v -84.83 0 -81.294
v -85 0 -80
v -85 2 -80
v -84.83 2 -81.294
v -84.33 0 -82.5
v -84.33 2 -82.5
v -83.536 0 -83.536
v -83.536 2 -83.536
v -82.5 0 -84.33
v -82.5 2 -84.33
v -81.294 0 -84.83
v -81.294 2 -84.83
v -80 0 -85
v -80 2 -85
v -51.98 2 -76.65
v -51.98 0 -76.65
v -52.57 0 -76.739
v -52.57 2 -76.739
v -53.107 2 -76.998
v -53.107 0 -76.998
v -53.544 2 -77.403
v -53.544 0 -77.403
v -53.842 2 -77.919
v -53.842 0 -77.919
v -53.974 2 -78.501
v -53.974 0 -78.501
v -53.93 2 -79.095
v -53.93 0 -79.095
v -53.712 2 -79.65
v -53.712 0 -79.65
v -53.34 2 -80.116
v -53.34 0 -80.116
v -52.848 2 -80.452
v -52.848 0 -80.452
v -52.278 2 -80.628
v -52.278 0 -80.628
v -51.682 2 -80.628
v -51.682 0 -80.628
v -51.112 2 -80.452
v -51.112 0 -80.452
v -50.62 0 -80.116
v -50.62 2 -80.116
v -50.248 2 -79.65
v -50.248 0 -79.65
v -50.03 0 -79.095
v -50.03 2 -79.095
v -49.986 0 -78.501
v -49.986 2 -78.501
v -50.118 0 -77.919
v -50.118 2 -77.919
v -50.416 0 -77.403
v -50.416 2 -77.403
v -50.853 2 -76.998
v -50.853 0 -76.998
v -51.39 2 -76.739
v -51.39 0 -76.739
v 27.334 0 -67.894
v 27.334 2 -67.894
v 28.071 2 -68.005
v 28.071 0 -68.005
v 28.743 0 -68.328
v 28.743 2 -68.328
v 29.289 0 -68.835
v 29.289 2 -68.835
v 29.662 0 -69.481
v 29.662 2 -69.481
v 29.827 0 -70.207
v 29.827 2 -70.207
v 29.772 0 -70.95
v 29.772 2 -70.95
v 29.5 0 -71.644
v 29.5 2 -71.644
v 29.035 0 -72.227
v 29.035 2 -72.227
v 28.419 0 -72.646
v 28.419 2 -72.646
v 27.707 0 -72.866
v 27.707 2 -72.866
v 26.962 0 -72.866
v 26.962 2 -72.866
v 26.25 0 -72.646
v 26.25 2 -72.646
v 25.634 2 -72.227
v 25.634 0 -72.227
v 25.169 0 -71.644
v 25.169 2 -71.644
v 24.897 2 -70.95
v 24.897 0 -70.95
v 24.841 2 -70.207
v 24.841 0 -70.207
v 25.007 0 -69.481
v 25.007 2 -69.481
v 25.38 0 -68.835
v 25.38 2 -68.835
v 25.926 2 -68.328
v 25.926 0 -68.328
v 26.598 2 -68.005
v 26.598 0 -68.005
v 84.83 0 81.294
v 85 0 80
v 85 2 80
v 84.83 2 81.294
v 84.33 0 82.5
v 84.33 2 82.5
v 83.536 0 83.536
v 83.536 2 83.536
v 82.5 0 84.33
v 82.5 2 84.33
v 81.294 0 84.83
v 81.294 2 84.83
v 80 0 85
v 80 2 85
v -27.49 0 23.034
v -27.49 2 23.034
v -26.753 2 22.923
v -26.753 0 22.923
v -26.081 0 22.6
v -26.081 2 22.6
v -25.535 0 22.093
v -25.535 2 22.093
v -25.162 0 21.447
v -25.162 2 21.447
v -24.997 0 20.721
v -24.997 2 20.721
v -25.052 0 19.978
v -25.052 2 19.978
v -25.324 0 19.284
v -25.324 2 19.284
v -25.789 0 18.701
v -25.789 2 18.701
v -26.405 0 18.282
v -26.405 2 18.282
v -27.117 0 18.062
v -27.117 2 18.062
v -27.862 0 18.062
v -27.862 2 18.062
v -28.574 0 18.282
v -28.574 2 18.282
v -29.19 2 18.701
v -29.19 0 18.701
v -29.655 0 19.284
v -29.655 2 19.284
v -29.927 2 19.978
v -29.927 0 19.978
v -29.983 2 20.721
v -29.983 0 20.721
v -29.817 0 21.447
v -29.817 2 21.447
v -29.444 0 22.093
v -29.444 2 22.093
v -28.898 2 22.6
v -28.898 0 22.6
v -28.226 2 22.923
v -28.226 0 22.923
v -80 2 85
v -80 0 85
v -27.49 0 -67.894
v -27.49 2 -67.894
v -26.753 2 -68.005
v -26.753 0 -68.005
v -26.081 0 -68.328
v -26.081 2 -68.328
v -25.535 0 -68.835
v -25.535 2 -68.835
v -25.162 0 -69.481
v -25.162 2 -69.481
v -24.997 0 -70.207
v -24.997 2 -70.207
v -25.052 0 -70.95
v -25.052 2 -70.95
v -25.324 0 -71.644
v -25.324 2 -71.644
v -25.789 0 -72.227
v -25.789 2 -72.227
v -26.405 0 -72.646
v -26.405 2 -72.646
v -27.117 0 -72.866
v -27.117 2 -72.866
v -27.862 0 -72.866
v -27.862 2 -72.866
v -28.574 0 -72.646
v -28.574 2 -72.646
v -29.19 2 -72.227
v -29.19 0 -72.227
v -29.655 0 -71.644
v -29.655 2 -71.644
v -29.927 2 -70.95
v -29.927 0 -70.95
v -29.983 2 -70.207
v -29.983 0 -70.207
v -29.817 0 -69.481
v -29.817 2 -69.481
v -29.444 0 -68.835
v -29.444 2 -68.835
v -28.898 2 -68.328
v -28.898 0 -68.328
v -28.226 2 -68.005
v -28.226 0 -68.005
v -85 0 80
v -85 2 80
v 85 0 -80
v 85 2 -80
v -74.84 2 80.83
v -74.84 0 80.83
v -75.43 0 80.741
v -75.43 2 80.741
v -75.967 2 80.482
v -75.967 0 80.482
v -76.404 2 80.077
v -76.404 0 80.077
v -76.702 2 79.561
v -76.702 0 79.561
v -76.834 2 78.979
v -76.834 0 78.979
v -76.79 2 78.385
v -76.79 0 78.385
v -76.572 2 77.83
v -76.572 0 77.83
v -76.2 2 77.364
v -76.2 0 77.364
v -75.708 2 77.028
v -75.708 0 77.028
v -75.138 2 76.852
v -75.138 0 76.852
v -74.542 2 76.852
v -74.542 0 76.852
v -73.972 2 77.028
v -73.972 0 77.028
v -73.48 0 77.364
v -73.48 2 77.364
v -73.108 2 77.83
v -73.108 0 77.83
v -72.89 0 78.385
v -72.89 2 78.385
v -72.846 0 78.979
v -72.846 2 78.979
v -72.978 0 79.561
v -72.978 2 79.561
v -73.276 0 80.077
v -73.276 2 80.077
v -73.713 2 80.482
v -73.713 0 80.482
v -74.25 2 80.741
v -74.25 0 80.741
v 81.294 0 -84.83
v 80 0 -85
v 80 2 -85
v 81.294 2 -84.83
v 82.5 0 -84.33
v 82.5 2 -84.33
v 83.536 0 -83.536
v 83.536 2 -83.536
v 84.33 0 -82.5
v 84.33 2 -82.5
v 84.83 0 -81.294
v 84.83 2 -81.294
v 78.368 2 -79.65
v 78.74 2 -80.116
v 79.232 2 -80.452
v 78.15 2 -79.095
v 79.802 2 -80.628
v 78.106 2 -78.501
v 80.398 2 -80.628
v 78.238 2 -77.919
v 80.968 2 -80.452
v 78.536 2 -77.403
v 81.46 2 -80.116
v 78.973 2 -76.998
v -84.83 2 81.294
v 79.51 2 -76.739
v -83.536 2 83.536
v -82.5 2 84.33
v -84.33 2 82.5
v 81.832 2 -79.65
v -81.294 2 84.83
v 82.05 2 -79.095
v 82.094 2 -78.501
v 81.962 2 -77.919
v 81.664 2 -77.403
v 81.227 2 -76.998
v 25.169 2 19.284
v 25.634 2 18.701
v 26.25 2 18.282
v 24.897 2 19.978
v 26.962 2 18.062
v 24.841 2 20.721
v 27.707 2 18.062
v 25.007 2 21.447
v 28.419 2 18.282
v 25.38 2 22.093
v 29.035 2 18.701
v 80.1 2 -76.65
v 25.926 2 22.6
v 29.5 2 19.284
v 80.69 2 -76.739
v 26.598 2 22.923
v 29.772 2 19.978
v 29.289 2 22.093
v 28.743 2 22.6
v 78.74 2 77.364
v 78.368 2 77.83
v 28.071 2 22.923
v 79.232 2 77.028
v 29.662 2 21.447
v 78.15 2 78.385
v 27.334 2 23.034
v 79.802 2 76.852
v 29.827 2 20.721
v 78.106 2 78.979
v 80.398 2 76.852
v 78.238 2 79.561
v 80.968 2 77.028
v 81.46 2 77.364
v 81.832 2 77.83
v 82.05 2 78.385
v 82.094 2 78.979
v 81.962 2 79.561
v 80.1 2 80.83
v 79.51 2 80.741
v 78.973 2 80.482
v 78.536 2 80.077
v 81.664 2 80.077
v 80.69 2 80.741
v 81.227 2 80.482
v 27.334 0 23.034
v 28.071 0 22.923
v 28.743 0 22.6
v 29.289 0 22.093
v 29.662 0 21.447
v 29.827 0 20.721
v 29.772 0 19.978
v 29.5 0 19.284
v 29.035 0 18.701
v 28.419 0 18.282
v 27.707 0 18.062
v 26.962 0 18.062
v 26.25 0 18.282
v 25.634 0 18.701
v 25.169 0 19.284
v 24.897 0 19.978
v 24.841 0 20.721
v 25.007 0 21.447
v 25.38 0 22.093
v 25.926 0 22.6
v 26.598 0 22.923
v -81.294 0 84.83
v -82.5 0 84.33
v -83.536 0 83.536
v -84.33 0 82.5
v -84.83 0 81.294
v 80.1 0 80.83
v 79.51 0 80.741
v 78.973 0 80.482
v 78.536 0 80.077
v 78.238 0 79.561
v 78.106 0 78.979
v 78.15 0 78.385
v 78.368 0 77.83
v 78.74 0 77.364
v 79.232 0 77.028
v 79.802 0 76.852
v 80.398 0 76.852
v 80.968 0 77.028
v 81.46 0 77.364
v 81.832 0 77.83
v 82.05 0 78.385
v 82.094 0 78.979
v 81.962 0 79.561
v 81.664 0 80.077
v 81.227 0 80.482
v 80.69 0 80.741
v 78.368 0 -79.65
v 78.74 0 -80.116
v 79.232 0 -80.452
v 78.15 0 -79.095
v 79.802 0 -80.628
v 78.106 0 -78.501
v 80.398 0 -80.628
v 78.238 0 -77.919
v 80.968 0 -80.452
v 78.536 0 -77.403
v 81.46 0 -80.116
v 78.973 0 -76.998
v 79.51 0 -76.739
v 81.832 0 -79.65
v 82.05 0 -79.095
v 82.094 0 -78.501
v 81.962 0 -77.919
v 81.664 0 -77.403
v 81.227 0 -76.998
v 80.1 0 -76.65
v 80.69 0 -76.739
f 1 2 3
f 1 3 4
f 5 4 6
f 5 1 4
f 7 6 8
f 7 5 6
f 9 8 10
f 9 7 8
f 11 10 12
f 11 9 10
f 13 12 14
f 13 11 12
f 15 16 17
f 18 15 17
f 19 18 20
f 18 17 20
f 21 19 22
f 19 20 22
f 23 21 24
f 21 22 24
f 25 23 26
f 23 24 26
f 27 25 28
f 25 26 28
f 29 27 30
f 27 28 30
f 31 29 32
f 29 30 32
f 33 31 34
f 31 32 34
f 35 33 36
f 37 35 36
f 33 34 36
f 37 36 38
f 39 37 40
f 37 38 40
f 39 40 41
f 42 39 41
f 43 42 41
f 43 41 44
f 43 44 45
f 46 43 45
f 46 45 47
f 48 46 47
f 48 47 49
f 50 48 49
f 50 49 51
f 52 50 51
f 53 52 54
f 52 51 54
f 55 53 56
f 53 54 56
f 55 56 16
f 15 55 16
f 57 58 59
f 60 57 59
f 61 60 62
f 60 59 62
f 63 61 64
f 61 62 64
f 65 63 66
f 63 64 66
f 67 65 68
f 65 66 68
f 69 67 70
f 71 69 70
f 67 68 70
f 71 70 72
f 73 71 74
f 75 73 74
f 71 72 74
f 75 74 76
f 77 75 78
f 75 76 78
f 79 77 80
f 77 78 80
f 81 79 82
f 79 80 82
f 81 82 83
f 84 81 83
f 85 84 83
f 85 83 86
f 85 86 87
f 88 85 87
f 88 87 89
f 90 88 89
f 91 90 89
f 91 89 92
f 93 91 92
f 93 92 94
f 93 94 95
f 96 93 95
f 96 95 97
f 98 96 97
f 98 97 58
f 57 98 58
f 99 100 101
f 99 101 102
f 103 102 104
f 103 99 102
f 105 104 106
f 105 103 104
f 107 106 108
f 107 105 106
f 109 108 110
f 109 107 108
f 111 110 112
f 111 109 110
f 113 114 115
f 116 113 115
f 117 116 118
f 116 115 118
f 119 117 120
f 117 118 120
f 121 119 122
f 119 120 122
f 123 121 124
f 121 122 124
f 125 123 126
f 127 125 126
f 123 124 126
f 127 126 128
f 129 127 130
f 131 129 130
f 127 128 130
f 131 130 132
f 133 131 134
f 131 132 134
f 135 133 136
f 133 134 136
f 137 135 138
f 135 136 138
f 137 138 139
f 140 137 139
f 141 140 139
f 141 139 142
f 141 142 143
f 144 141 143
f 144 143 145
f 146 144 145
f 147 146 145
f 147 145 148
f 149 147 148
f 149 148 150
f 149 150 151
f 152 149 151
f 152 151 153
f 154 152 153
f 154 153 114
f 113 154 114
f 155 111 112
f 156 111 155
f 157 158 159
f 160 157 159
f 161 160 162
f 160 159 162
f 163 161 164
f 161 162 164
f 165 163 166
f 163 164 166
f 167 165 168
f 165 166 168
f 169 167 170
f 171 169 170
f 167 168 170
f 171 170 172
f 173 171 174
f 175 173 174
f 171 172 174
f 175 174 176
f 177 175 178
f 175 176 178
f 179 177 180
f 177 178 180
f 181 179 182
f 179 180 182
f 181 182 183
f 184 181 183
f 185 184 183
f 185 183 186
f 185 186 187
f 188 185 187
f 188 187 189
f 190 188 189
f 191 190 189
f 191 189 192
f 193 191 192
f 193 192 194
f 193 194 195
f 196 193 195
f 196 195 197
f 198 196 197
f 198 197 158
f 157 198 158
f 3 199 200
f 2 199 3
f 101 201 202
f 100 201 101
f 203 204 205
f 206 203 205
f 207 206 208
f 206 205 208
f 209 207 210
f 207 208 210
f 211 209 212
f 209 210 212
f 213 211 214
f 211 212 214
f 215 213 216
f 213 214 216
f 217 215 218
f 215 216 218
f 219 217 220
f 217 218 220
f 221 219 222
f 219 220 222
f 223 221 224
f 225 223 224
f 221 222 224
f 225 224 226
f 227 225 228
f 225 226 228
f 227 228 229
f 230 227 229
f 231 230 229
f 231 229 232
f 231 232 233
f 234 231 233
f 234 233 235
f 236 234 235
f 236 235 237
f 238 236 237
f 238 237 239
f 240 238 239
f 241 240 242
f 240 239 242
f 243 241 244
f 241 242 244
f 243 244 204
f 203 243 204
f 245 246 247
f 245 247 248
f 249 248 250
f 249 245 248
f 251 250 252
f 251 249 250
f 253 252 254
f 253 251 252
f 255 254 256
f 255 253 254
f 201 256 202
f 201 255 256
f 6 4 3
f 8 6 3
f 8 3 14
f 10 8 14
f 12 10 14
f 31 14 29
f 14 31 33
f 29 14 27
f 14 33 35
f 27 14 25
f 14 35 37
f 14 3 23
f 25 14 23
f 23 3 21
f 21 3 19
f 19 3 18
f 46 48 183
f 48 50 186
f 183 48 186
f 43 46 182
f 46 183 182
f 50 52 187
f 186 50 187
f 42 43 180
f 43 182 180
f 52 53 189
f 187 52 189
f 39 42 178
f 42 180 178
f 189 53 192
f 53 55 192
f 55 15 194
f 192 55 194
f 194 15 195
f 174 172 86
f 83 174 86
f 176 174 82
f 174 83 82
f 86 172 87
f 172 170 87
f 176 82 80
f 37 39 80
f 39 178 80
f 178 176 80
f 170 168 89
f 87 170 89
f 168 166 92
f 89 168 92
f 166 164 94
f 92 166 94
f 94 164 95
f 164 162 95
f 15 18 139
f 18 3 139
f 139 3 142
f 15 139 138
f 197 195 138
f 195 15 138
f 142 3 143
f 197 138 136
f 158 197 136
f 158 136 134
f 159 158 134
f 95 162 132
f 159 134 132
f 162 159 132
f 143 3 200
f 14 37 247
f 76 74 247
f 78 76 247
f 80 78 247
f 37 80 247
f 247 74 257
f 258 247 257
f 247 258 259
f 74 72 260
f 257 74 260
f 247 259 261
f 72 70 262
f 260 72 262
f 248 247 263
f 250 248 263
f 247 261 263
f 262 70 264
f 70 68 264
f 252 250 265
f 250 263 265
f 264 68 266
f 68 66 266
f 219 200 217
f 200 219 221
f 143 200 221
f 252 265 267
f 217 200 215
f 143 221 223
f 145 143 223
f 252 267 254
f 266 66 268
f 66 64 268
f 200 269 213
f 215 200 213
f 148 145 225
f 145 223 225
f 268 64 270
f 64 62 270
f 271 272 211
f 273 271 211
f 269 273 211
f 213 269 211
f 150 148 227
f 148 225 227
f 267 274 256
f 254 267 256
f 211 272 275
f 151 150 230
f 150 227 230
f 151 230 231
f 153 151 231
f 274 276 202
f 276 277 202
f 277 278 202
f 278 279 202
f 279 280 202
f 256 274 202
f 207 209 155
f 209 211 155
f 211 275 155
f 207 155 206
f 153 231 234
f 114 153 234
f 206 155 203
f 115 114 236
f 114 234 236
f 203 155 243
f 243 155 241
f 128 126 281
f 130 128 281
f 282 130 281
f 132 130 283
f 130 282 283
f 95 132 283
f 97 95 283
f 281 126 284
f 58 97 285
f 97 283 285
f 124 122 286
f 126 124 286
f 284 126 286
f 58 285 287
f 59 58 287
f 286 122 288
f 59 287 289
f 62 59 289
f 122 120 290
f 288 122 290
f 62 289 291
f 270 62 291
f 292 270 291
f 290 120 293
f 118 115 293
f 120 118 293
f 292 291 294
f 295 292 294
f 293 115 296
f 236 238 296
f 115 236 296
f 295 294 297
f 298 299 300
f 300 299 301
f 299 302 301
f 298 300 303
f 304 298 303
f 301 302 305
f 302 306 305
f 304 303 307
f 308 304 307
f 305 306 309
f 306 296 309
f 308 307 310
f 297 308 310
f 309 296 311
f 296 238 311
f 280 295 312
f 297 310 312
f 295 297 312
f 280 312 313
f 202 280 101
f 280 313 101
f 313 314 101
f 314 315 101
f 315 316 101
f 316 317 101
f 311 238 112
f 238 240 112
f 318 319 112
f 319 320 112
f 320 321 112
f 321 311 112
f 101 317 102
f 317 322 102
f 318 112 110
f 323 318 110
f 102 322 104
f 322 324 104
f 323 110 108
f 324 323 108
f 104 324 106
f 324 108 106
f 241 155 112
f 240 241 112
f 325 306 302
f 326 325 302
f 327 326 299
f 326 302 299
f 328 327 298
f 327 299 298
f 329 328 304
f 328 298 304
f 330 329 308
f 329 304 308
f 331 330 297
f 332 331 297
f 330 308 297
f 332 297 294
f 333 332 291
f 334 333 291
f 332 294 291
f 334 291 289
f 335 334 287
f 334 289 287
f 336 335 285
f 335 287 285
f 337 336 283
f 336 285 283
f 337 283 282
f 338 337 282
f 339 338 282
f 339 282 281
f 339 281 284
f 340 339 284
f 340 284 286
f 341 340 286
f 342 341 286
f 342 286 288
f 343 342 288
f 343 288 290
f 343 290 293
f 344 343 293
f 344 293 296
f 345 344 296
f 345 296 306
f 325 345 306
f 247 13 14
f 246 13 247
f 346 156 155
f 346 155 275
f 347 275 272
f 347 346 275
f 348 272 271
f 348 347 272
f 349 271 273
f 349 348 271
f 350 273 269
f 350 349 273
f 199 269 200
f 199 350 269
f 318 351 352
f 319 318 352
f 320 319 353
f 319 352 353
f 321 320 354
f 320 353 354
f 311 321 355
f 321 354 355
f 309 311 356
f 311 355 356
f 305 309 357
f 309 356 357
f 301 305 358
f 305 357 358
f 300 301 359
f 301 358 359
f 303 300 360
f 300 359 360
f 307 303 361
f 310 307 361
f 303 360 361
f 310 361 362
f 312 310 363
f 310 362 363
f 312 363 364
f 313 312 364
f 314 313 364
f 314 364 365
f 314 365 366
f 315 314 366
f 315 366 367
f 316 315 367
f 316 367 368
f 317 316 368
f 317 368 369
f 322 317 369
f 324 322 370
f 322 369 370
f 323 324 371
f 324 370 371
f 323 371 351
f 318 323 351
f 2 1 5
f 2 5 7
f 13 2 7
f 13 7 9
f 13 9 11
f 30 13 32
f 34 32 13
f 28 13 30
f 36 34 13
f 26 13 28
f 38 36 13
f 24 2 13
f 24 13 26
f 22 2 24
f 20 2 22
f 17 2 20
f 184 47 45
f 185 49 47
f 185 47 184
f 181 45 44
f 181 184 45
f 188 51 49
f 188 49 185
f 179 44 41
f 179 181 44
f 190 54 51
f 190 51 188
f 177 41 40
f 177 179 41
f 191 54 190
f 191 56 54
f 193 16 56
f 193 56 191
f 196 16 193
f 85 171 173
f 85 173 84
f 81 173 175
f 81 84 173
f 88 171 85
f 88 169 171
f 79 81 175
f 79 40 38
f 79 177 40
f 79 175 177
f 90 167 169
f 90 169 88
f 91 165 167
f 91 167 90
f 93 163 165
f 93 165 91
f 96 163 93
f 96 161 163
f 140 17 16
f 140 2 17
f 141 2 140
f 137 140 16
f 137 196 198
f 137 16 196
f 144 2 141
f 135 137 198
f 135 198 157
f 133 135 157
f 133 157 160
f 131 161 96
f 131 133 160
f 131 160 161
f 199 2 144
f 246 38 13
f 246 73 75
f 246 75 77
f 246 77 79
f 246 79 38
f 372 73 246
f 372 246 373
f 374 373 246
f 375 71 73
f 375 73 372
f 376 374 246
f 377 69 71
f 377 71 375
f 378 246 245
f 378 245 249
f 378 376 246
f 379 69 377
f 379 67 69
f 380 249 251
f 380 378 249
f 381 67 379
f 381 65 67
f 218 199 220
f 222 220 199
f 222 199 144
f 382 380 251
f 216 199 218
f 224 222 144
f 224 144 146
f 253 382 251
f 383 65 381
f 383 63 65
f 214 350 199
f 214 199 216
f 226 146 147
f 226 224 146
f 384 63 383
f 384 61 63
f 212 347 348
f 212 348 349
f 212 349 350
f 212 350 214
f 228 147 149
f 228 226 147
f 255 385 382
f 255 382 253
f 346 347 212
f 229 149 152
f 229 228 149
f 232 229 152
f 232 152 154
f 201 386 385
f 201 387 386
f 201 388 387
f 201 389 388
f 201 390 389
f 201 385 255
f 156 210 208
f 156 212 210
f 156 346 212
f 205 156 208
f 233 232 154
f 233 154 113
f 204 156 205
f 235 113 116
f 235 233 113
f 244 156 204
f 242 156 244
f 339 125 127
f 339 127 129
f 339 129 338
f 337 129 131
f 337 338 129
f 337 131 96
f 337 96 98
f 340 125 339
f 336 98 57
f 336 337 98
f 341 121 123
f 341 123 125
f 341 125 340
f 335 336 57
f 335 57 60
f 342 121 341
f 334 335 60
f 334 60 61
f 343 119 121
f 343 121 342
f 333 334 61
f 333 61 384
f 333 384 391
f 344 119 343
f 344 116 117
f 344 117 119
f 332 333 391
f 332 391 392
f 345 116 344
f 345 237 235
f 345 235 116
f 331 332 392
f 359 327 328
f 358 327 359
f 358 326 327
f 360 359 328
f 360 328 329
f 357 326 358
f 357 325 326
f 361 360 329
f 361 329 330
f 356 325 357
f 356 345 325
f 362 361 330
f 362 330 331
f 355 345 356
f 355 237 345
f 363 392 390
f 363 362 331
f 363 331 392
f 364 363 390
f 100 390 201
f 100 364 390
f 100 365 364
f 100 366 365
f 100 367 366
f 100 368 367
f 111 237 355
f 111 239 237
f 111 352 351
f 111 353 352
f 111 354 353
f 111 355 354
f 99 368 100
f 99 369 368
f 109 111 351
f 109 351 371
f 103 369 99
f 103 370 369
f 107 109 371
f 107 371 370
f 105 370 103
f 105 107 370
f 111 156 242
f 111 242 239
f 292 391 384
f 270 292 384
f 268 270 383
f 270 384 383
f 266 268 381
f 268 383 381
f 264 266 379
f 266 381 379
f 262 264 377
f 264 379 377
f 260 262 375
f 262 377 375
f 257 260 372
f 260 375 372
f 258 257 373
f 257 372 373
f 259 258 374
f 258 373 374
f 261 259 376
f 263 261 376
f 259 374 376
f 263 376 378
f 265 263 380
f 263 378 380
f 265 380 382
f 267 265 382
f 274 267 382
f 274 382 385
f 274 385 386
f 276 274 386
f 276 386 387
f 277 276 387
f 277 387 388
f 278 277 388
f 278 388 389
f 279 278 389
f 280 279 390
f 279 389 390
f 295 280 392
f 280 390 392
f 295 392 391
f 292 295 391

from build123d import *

# Parameters (mm, degrees)
SKETCH_1_R          = 2
EXTRUDE_1_DEPTH     = 2
SKETCH_3_R          = 2.5
CUT_EXTRUDE_1_DEPTH = 10


with BuildPart() as part:
    # Эскиз1 → Бобышка-Вытянуть1 (new body)
    with BuildSketch(Plane.XZ):
        with BuildLine():
            Line((80, 85), (-80, 85))
            ThreePointArc((-80, 85), (-83.535533906, 83.535533906), (-85, 80))
            Line((-85, 80), (-85, -80))
            ThreePointArc((-85, -80), (-83.535533906, -83.535533906), (-80, -85))
            Line((-80, -85), (80, -85))
            ThreePointArc((80, -85), (83.535533906, -83.535533906), (85, -80))
            Line((85, -80), (85, 80))
            ThreePointArc((85, 80), (83.535533906, 83.535533906), (80, 85))
        make_face()
        with Locations(Location((-74.84, 78.83, 0), (0, 0, 90))):
            Circle(SKETCH_1_R, mode=Mode.SUBTRACT)
        with Locations(Location((80.1, 78.83, 0), (0, 0, 90))):
            Circle(SKETCH_1_R, mode=Mode.SUBTRACT)
        with Locations(Location((80.1, -78.65, 0), (0, 0, 90))):
            Circle(SKETCH_1_R, mode=Mode.SUBTRACT)
        with Locations(Location((-51.98, -78.65, 0), (0, 0, 90))):
            Circle(SKETCH_1_R, mode=Mode.SUBTRACT)
    extrude(amount=-EXTRUDE_1_DEPTH)

    # Эскиз3 → Вырез-Вытянуть1 (cut)
    with BuildSketch(Plane(origin=(0, 2, 0), x_dir=(1, 0, 0), z_dir=(0, 1, 0))):
        with Locations(Location((-27.489542331, -20.533937546, 0), (0, 0, 270))):
            Circle(SKETCH_3_R)
        with Locations(Location((-27.489542331, 70.393970701, 0), (0, 0, 270))):
            Circle(SKETCH_3_R)
        with Locations(Location((27.334465925, -20.533937546, 0), (0, 0, 270))):
            Circle(SKETCH_3_R)
        with Locations(Location((27.334465925, 70.393970701, 0), (0, 0, 270))):
            Circle(SKETCH_3_R)
    extrude(amount=-CUT_EXTRUDE_1_DEPTH, mode=Mode.SUBTRACT)


solid = part.part
